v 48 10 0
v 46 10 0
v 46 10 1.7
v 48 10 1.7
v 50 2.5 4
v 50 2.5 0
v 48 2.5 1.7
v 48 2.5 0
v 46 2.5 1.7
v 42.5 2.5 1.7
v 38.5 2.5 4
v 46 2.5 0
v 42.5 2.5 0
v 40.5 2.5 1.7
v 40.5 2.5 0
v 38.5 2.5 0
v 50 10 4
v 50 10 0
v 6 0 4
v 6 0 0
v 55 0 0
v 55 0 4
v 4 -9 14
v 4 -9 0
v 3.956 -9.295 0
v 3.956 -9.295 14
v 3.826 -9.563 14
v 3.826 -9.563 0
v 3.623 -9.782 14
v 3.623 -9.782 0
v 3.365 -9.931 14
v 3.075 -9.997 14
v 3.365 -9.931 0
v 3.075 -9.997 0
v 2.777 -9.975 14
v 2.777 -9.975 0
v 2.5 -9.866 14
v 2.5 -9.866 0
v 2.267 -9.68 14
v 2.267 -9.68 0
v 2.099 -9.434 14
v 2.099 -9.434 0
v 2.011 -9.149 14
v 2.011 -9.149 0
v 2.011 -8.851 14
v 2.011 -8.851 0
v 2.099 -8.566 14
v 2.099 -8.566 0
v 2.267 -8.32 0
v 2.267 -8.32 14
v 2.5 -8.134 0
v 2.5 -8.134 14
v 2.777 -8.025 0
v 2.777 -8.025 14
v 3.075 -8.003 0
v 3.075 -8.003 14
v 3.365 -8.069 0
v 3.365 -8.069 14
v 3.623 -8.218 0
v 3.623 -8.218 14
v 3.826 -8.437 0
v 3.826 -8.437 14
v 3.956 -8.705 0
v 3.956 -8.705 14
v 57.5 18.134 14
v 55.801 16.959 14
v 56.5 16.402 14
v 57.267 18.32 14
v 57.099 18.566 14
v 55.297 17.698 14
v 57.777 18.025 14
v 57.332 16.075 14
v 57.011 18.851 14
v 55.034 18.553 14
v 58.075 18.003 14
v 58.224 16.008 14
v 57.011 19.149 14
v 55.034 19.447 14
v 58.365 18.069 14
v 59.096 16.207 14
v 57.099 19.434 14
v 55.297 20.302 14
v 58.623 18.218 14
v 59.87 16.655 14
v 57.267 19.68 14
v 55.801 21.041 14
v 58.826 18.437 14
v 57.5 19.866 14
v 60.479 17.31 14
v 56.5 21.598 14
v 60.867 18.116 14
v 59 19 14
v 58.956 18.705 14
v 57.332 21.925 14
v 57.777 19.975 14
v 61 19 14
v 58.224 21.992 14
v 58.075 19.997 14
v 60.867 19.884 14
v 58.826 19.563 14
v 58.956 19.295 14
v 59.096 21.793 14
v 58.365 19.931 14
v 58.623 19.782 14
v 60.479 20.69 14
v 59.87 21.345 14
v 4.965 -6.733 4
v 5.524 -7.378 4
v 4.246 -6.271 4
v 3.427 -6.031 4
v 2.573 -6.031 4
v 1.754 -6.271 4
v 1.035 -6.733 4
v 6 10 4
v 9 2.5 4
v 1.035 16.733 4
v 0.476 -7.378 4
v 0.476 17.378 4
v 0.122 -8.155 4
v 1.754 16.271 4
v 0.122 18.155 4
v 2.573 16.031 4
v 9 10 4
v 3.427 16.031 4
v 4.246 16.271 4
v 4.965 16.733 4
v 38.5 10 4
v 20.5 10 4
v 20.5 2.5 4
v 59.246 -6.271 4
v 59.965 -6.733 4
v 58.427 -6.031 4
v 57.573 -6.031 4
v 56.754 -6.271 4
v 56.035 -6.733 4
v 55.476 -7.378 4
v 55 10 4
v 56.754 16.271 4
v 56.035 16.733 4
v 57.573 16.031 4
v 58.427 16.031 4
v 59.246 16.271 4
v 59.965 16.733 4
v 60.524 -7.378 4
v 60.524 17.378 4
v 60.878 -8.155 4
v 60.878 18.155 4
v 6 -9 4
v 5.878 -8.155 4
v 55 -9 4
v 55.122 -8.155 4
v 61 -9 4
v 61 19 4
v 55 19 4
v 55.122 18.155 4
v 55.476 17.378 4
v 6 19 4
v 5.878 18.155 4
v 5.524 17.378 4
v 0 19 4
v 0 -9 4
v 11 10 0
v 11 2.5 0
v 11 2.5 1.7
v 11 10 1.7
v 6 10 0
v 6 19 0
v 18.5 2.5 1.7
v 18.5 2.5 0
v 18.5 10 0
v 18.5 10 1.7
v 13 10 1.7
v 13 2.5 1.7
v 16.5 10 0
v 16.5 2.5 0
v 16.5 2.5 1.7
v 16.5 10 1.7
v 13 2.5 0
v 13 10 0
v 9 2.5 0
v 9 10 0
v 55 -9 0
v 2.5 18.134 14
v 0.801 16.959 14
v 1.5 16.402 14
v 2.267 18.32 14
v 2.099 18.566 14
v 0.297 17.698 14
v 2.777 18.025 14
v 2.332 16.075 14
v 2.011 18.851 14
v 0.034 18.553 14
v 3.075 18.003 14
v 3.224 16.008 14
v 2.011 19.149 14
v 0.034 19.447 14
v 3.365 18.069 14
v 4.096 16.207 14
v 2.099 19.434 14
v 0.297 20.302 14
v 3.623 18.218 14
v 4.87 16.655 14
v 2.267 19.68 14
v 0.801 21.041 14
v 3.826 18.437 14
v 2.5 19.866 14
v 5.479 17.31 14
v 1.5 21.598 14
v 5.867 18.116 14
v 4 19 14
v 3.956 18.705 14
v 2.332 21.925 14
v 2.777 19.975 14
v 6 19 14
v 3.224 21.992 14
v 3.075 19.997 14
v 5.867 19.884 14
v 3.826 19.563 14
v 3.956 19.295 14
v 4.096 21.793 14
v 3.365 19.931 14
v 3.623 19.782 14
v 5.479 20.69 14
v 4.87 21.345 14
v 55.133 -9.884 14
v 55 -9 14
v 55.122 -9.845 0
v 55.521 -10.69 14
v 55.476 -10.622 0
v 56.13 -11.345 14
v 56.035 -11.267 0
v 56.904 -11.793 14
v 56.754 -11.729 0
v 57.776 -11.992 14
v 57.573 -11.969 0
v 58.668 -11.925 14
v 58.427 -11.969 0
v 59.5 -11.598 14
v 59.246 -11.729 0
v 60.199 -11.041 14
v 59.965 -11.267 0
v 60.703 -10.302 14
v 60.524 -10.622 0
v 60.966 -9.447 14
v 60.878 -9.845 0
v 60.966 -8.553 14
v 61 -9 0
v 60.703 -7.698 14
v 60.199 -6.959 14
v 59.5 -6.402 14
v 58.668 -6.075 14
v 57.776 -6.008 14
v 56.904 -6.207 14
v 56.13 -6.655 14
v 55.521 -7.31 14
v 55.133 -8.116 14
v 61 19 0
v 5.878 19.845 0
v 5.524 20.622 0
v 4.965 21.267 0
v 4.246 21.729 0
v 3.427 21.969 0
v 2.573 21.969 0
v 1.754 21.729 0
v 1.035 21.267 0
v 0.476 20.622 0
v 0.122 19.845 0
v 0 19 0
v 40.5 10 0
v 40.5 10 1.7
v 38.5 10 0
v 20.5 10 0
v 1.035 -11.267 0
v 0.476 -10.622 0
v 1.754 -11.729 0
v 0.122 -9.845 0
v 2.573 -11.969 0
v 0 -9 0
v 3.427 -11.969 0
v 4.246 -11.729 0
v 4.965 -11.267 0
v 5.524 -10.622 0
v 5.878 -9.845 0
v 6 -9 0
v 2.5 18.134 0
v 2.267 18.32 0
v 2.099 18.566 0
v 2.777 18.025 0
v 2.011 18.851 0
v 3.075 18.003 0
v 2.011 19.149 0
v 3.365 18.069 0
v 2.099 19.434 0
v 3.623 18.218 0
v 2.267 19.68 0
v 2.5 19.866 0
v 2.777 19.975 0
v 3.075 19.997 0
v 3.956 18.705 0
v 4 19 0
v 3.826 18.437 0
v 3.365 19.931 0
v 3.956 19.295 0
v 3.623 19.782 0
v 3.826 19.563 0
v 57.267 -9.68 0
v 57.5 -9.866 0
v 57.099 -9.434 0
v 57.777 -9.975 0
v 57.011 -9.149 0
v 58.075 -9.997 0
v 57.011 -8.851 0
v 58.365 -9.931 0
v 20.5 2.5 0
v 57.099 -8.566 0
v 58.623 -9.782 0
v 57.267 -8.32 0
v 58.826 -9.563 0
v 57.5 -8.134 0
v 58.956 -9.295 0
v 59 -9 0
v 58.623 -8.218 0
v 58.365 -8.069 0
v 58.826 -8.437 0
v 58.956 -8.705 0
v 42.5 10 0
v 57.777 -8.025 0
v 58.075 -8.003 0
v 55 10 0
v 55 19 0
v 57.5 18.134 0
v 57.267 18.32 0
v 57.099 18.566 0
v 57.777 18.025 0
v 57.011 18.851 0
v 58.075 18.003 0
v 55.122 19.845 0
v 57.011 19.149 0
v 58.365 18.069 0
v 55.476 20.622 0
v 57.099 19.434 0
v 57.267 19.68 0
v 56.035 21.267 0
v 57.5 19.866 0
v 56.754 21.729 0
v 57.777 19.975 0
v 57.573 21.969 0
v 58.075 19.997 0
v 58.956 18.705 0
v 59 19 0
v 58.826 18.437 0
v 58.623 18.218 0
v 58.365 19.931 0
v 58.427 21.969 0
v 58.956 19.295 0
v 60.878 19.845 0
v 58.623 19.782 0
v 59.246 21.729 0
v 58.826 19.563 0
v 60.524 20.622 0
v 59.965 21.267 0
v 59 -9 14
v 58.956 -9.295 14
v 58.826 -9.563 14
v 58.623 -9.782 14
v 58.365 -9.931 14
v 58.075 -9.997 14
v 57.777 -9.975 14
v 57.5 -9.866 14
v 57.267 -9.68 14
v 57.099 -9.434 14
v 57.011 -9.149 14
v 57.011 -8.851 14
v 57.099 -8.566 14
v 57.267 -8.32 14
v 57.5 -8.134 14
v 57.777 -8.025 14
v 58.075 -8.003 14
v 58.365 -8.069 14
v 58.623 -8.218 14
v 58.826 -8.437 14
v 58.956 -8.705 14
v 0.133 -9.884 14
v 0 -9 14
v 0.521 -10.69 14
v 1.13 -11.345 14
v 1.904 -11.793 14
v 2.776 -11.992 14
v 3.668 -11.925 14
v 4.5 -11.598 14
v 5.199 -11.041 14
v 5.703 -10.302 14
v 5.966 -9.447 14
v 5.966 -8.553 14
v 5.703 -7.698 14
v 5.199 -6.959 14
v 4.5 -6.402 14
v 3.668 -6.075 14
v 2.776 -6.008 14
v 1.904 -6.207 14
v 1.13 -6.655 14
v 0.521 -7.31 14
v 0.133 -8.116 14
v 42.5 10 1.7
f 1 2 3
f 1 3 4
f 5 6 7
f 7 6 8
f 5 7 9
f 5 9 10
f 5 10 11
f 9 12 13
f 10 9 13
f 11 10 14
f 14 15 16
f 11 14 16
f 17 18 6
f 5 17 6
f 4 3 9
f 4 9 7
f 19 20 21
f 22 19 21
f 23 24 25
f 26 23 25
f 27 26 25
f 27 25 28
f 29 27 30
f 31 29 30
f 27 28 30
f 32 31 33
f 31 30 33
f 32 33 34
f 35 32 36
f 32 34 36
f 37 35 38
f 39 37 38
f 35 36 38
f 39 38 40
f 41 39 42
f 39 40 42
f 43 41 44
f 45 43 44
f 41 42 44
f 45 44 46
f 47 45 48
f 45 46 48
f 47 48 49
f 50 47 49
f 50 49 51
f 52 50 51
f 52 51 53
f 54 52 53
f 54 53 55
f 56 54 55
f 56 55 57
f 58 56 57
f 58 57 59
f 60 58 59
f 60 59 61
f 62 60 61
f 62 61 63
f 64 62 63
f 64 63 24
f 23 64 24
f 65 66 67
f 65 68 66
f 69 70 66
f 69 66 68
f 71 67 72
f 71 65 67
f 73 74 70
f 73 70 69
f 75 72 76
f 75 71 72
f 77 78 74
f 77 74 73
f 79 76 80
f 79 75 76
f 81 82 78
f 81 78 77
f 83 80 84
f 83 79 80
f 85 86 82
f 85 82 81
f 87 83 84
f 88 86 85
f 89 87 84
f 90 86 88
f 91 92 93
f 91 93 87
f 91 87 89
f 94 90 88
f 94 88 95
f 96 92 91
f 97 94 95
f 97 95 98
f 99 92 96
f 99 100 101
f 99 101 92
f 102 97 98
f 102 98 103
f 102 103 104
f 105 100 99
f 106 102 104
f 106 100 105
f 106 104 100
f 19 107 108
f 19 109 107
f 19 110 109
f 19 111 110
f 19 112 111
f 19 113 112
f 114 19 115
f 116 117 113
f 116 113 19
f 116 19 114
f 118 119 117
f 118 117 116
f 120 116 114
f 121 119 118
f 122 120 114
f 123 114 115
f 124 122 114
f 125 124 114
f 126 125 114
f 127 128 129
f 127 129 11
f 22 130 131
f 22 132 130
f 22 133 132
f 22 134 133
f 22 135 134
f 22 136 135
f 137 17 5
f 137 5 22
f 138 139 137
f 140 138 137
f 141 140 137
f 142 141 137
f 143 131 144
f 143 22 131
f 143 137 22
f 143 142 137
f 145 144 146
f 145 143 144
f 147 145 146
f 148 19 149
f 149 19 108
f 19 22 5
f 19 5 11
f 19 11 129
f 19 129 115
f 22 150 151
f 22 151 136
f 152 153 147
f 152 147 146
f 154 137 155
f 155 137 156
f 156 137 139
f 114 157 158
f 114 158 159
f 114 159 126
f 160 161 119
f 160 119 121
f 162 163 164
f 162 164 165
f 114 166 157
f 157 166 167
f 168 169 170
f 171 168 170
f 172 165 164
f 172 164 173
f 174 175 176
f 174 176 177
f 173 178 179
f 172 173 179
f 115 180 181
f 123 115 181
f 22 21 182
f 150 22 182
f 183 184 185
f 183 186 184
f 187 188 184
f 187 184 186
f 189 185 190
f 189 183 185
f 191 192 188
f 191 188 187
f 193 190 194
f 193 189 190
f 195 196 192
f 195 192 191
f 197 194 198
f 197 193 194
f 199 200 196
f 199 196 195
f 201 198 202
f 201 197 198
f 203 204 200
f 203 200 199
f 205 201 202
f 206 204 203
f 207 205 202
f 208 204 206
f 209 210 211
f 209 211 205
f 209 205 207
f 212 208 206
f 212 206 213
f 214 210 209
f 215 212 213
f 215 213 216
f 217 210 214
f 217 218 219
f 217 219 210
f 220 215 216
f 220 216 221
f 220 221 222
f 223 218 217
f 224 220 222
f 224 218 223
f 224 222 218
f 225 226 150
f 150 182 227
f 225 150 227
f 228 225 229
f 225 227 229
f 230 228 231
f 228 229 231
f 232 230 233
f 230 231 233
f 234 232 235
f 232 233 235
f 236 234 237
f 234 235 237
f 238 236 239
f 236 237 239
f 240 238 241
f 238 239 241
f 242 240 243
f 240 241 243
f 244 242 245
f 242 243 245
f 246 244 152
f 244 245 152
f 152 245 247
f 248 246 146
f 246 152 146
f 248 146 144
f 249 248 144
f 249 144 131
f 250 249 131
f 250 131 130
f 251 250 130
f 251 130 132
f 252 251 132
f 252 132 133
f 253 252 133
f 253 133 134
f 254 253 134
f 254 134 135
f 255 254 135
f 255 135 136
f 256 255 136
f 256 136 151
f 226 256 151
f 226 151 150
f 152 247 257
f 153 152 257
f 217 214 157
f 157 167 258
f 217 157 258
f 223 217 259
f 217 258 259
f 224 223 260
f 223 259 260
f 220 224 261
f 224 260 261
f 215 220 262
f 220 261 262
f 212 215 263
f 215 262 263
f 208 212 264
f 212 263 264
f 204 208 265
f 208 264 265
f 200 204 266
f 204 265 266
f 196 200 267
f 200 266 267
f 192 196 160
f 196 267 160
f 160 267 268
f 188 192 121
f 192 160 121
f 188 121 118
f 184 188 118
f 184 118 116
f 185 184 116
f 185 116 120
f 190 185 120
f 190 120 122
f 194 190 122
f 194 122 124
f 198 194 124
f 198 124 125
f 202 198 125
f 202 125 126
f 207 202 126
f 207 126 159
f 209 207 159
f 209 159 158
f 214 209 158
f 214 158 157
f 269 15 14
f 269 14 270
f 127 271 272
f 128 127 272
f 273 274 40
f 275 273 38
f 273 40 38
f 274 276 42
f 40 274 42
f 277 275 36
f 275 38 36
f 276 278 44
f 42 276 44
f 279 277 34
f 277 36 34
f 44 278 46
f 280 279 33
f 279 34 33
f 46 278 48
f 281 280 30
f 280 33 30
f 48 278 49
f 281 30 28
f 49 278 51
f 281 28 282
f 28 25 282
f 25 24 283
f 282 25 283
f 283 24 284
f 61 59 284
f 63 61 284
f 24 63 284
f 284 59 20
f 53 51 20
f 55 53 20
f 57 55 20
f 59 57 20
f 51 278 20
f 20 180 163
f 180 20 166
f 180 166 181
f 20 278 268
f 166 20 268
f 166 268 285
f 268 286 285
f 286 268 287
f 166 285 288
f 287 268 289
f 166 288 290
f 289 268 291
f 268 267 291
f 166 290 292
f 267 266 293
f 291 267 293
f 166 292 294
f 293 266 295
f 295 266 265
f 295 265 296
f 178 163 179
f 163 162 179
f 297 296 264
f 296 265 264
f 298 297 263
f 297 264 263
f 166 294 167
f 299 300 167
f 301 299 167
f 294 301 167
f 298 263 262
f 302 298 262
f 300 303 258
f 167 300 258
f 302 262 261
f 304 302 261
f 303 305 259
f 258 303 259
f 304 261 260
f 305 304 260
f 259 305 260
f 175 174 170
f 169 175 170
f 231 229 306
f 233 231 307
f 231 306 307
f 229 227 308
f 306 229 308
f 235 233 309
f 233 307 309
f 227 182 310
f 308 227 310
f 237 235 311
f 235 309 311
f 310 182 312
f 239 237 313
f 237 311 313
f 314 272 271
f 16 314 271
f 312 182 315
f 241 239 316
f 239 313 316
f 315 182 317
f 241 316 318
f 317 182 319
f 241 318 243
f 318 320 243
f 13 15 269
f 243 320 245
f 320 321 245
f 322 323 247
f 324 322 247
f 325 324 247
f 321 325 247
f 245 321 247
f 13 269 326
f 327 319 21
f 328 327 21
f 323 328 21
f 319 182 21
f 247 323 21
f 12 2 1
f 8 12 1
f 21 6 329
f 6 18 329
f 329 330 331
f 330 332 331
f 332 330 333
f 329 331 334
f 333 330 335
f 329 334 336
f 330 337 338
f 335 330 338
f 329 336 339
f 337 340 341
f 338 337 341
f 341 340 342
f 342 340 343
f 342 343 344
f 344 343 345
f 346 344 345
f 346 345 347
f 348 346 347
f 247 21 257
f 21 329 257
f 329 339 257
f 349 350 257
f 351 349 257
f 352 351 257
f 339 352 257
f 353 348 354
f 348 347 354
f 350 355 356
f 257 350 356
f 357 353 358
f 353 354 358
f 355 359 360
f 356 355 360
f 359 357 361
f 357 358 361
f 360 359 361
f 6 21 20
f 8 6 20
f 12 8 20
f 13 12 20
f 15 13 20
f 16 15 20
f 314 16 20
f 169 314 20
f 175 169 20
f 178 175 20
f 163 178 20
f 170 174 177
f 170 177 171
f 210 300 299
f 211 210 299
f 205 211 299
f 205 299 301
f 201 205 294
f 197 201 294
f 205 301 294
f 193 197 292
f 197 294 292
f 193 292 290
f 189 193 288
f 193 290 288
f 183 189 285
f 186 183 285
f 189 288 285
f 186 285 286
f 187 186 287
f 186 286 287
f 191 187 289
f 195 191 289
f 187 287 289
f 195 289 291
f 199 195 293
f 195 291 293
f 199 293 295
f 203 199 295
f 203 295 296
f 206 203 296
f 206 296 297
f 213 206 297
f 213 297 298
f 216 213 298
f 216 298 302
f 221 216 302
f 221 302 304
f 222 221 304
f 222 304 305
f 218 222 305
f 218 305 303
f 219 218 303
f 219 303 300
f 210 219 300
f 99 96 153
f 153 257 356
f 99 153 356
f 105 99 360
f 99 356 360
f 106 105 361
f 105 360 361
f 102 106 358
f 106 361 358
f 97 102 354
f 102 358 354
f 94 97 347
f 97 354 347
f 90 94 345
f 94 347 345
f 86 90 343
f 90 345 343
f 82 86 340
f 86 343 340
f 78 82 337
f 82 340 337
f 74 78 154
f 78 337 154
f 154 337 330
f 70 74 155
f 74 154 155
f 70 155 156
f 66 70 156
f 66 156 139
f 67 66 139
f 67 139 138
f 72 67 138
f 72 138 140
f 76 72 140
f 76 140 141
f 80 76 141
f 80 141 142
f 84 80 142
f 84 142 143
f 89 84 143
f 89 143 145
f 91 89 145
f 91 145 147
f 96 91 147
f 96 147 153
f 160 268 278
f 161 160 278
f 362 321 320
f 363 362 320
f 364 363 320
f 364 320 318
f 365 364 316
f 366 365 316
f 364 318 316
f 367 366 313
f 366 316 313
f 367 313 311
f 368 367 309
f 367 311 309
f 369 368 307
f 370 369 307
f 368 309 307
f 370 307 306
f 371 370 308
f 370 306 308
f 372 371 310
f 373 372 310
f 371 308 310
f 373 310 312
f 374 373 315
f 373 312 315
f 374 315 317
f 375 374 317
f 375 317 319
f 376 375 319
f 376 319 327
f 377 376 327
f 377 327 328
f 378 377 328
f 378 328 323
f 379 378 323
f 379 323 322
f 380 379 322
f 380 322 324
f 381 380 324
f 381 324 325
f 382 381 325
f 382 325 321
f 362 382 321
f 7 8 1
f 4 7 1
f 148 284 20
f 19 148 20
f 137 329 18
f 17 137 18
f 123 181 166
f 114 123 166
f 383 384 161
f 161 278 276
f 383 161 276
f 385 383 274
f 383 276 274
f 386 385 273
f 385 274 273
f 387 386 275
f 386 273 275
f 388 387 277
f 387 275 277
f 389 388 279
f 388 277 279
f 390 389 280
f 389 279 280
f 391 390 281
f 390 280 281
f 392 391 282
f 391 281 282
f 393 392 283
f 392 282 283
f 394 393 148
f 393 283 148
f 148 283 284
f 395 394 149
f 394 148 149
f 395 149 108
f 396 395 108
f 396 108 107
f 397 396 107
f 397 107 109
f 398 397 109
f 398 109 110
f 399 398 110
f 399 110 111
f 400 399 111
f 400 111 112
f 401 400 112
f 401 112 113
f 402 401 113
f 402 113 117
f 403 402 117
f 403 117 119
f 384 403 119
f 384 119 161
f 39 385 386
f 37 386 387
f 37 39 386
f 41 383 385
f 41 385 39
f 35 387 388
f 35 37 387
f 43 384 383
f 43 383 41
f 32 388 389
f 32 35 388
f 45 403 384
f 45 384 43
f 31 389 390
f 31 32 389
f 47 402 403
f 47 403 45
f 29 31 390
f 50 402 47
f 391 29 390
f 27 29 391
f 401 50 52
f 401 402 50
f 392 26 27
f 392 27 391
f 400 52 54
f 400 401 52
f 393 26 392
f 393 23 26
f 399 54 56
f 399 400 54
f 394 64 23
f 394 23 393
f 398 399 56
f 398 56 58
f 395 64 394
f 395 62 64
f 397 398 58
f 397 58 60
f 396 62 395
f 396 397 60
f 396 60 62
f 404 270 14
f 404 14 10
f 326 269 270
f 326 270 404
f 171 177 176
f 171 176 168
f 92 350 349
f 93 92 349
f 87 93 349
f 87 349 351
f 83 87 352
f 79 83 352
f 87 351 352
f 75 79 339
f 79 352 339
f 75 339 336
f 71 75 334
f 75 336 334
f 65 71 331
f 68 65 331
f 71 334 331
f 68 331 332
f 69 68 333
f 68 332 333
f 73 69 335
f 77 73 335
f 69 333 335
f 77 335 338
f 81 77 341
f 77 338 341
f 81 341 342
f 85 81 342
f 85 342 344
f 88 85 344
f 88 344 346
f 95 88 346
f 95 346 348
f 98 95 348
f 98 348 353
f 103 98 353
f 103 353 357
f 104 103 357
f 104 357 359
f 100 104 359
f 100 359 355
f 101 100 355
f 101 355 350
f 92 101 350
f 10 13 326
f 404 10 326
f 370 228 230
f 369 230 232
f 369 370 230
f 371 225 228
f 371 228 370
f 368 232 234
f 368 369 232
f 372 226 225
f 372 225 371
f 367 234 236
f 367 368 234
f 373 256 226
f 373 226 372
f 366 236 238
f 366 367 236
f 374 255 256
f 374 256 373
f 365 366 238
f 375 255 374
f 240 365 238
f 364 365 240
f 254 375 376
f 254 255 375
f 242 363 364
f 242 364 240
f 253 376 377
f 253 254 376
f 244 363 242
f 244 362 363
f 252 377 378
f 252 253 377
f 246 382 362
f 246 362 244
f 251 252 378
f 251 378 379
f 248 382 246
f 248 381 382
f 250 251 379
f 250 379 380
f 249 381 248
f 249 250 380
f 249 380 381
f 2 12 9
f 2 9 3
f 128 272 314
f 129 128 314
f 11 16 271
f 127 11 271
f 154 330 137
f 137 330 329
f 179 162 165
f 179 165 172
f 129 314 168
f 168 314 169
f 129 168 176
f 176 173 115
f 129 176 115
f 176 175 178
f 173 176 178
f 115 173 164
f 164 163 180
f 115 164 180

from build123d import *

# Parameters (mm, degrees)
F1_DEPTH = 4
F2_W     = 2
F2_H     = 7.5
F3_DEPTH = 1.7
F5_DEPTH = 10
F6_R     = 1
F7_DEPTH = 25


with BuildPart() as f1:
    # F0 (on Top) → F1 (new body)
    with BuildSketch(Plane.XY):
        with BuildLine():
            Line((6, 0), (55, 0))
            Line((55, 0), (55, -9))
            ThreePointArc((55, -9), (58, -12), (61, -9))
            Line((61, -9), (61, 19))
            ThreePointArc((61, 19), (58, 22), (55, 19))
            Line((55, 19), (55, 10))
            Line((55, 10), (50, 10))
            Line((50, 10), (50, 2.5))
            Line((50, 2.5), (38.5, 2.5))
            Line((38.5, 2.5), (38.5, 10))
            Line((38.5, 10), (20.5, 10))
            Line((20.5, 10), (20.5, 2.5))
            Line((20.5, 2.5), (9, 2.5))
            Line((9, 2.5), (9, 10))
            Line((9, 10), (6, 10))
            Line((6, 10), (6, 19))
            ThreePointArc((6, 19), (3, 22), (0, 19))
            Line((0, 19), (0, -9))
            ThreePointArc((0, -9), (3, -12), (6, -9))
            Line((6, -9), (6, 0))
        make_face()
    extrude(amount=F1_DEPTH)

    # F2 (on Top) → F3 (join)
    with BuildSketch(Plane.XY):
        with Locations((12, 6.25)):
            Rectangle(F2_W, F2_H)
        with Locations((17.5, 6.25)):
            Rectangle(F2_W, F2_H)
        with Locations((41.5, 6.25)):
            Rectangle(F2_W, F2_H)
        with Locations((47, 6.25)):
            Rectangle(F2_W, F2_H)
    extrude(amount=F3_DEPTH)

    # F4 (on face) → F5 (join)
    with BuildSketch(Plane.XY.offset(4)):
        with BuildLine():
            ThreePointArc((0, 19), (3, 16), (6, 19))
            ThreePointArc((6, 19), (3, 22), (0, 19))
        make_face()
        with BuildLine():
            ThreePointArc((6, -9), (3, -6), (0, -9))
            ThreePointArc((0, -9), (3, -12), (6, -9))
        make_face()
        with BuildLine():
            ThreePointArc((61, -9), (58, -6), (55, -9))
            ThreePointArc((55, -9), (58, -12), (61, -9))
        make_face()
        with BuildLine():
            ThreePointArc((55, 19), (58, 16), (61, 19))
            ThreePointArc((61, 19), (58, 22), (55, 19))
        make_face()
    extrude(amount=F5_DEPTH)

    # F6 (on face) → F7 (cut)
    with BuildSketch(Plane(origin=(0, 0, 0), x_dir=(1, 0, 0), z_dir=(0, 0, -1))):
        with Locations((3, 9)):
            Circle(F6_R)
        with Locations((58, 9)):
            Circle(F6_R)
        with Locations((58, -19)):
            Circle(F6_R)
        with Locations((3, -19)):
            Circle(F6_R)
    extrude(amount=-F7_DEPTH, mode=Mode.SUBTRACT)


solid = f1.part
